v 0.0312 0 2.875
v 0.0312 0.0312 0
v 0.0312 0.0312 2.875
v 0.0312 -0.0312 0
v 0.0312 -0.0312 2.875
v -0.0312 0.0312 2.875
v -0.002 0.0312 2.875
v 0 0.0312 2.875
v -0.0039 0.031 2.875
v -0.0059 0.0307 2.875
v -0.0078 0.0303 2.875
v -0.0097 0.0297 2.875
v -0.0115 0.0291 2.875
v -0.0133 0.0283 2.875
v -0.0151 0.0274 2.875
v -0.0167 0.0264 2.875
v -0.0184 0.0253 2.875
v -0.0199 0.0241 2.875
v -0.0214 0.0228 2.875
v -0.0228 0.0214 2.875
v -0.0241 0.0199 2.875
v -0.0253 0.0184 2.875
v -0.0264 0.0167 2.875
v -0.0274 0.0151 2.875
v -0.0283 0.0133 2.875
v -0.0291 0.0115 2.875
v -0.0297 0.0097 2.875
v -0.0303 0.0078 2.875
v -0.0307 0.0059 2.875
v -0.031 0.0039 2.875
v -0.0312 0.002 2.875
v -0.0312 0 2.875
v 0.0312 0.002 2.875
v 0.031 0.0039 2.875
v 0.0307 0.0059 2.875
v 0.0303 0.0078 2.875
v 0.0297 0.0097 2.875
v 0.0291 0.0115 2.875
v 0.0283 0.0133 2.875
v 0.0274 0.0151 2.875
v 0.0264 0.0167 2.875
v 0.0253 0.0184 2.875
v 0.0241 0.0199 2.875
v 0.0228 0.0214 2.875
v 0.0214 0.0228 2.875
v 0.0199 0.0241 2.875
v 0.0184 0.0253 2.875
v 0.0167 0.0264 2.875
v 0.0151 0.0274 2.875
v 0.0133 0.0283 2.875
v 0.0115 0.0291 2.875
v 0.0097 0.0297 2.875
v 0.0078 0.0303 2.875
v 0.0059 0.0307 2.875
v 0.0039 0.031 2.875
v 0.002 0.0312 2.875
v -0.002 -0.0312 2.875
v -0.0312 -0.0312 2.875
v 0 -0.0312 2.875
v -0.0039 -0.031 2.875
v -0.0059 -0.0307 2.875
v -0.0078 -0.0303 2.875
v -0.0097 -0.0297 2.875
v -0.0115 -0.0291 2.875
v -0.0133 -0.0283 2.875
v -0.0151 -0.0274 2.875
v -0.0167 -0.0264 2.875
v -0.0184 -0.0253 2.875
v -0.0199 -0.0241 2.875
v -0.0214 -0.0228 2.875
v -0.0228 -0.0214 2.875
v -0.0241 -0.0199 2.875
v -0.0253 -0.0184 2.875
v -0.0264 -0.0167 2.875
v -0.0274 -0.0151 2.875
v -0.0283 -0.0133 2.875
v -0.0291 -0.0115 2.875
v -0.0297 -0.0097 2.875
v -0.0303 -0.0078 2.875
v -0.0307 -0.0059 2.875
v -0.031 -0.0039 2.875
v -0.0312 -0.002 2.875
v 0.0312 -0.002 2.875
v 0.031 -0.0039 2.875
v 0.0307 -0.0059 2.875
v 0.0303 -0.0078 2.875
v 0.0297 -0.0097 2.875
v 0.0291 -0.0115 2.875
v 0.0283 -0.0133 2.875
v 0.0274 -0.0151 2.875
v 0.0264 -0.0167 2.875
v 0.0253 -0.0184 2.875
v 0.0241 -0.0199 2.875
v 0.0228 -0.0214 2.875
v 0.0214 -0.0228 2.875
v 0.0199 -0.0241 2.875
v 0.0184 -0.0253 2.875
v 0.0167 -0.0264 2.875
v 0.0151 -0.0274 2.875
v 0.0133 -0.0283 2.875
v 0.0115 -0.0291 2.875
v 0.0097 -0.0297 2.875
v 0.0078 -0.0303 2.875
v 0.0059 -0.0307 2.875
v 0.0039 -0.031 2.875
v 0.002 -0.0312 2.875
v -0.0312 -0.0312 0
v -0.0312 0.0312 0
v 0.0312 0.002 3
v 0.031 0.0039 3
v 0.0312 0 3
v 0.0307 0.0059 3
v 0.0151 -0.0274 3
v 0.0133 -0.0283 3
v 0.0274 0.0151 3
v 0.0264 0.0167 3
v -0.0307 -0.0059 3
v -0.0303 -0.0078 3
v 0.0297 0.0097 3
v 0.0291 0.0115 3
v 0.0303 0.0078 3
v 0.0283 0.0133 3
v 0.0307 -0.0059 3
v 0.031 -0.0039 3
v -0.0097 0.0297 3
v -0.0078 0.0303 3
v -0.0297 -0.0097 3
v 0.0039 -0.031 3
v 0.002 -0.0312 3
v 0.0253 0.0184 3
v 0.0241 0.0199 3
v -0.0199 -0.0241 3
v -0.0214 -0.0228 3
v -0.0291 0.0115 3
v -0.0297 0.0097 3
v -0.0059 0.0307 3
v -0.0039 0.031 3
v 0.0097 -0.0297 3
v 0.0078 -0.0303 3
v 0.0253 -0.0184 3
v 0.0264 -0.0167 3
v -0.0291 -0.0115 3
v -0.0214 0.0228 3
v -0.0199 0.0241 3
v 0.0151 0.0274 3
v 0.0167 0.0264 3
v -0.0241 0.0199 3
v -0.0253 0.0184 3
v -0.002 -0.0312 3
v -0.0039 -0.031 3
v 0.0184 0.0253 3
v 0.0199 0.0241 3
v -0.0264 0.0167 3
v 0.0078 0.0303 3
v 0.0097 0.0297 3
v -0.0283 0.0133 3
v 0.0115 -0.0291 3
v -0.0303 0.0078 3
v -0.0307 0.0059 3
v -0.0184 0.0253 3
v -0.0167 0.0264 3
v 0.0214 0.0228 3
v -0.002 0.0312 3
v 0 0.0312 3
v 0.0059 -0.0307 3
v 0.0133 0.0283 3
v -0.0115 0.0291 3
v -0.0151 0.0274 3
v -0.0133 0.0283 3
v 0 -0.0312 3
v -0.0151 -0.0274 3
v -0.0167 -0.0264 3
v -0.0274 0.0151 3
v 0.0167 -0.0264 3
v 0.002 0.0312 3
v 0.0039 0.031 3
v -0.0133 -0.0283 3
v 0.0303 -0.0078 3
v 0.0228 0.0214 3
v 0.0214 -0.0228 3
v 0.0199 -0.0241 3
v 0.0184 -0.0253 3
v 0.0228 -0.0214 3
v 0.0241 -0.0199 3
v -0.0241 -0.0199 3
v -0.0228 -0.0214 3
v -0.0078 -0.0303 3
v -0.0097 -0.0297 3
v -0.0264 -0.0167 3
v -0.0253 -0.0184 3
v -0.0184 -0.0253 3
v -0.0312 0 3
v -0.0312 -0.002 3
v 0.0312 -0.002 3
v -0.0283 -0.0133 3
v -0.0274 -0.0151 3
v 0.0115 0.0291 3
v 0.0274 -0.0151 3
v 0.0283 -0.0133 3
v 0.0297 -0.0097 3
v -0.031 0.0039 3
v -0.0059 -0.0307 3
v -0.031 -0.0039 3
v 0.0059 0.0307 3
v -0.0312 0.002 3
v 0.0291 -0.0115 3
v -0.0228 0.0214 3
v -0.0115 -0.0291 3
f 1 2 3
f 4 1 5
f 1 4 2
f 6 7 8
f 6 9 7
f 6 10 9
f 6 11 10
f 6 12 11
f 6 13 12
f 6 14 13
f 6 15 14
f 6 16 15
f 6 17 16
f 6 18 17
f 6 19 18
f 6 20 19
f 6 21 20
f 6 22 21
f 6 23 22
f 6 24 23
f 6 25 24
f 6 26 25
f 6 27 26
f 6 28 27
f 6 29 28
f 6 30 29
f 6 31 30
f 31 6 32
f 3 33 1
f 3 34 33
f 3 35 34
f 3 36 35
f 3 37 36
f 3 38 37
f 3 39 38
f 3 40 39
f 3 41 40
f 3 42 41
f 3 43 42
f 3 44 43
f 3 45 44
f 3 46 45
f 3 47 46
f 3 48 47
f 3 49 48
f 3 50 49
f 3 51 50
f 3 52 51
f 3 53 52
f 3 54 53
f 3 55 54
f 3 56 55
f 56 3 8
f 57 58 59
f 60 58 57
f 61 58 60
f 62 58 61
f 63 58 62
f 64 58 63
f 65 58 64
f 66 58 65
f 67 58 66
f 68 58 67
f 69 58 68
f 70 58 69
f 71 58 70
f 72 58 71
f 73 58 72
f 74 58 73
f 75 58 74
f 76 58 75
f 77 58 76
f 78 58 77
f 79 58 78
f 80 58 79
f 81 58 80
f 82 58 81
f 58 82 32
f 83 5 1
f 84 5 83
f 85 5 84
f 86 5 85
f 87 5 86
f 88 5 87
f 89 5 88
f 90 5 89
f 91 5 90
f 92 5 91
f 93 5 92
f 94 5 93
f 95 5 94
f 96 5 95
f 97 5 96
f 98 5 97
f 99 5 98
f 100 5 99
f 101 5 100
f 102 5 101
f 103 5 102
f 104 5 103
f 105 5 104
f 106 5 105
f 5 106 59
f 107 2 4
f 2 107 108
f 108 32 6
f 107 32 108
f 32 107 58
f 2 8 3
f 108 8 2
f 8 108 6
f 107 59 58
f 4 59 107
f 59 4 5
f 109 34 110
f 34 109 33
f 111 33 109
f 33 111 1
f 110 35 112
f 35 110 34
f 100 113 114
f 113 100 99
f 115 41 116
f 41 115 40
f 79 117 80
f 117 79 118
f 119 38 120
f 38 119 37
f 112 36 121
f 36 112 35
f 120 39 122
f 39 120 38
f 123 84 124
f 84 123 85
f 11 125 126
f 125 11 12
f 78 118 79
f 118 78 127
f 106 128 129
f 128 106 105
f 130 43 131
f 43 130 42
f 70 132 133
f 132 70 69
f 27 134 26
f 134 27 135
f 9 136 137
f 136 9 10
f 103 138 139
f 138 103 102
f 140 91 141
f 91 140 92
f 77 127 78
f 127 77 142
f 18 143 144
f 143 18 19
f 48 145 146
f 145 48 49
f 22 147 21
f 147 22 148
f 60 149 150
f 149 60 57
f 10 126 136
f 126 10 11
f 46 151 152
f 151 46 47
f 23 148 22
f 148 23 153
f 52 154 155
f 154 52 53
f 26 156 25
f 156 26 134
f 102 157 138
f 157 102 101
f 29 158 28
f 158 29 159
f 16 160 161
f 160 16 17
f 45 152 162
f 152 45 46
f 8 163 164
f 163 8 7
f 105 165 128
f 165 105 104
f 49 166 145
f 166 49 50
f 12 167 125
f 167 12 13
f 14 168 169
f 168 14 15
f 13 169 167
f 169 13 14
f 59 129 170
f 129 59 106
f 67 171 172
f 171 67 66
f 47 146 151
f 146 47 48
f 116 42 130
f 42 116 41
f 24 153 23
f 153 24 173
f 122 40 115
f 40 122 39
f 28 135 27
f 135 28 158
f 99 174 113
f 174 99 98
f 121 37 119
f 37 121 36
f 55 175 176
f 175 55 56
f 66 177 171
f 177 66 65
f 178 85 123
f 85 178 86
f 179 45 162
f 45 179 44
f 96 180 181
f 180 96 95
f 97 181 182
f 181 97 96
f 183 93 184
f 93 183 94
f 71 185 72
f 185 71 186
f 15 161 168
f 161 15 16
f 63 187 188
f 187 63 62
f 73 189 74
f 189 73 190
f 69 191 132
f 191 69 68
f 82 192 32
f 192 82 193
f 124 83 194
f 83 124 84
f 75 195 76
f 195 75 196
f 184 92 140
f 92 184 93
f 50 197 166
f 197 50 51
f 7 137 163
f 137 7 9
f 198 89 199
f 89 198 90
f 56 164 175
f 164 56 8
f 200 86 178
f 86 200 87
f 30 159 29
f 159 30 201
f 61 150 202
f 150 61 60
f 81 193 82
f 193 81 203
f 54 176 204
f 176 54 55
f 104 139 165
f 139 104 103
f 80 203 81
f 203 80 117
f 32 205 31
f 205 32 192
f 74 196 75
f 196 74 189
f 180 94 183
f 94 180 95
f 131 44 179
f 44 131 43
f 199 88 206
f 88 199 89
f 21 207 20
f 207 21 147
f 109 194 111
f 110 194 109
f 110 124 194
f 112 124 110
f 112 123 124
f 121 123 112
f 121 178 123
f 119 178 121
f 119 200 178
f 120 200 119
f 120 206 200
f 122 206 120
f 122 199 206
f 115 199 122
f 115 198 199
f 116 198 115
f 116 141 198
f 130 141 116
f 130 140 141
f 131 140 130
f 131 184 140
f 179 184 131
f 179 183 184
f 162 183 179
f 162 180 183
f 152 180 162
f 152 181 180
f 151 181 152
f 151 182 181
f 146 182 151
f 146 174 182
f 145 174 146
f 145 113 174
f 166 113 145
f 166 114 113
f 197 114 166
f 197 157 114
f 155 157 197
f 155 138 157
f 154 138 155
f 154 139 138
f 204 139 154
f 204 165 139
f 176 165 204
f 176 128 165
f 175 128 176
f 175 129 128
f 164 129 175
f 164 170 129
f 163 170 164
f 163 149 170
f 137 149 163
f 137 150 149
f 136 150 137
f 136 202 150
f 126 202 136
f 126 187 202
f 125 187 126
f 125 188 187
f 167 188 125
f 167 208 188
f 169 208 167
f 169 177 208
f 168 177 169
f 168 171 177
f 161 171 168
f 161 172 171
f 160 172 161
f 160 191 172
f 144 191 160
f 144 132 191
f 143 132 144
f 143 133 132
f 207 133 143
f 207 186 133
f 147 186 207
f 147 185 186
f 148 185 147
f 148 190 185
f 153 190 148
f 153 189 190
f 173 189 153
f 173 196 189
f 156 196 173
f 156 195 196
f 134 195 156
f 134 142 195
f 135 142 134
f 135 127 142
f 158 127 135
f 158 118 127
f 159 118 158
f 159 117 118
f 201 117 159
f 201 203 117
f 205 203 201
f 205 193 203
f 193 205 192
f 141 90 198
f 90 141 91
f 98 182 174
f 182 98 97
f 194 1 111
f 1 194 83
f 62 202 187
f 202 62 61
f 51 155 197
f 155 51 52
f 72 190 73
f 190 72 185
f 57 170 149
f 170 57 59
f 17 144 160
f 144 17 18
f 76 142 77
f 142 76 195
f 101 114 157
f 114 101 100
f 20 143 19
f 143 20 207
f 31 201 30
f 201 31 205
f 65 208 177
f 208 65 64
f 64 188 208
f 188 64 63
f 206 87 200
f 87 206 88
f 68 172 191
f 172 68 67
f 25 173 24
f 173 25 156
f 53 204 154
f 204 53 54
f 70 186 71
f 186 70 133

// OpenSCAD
// file: ../../prop/colors.scad
// colors.scad
// Credit: David Powell, OpenSCAN Forum



//group ABS_<colorname>
//	discription  common 3d printer ABS filament colors
// actual colours may need some tweaking

ABS_Nature =[0.8,0.8,0.8,0.8];
ABS_White =[0.9,0.9,0.9,1];
ABS_Black =[0.1,0.1,0.1,1];
ABS_Red = [0.7,0,0,1];
ABS_Green = [0,0.7,0,1];
ABS_Blue = [0,0,0.7,1];
ABS_Orange =[0.8,0.4,0,1];
ABS_Purple =[0.7,0,0.7,1];
ABS_Brown =[0.6,0.2,0.2,1];
ABS_Glow_Blue =[0,0,.99,1];
ABS_Flurescence_Green =[0,1,0,1];
ABS_Flurescence_Yellow = [0.9,0.9,0,1];

//group PLA_<colorname>
//	discription  common 3d printer PLA filament colors
// actual colours may need some tweaking

PLA_Nature =[0.8,0.8,0.8,0.8];
PLA_White =[0.9,0.9,0.9,1];
PLA_Black =[0.1,0.1,0.1,1];
PLA_Red = [0.7,0,0,1];
PLA_Green = [0,0.7,0,1];
PLA_Blue = [0,0,0.7,1];
PLA_Orange =[0.8,0.4,0,1];
PLA_Purple =[0.7,0,0.7,1];
PLA_Brown =[0.6,0.2,0.2,1];
PLA_Glow_Blue =[0,0,.99,1];
PLA_Flurescence_Green =[0,1,0,1];
PLA_Flurescence_Yellow = [0.9,0.9,0,1];

//group ANODIZED_<colorname>
//	discription  common aluminium anodized colors
// these don't seem to follow normal color tables as the process
// produces a color change difference to the named color
// dew to base metal
// actual colours may need some tweaking

ANODIZED_Red =[0.7,0,0,1];
ANODIZED_Gold =[0.8,0.8,0.0,1];
ANODIZED_Black =[0.1,0.1,0.1,1];
ANODIZED_Blue =[0,0,0.7,1];
ANODIZED_Green =[0,0.5,0,1];
ANODIZED_Gray =[0.4,0.4,0.4,1];
ANODIZED_Dark_Blue =[0,0.2,0.6,1];
ANODIZED_Lime_Green =[0,0.8,0,1];
ANODIZED_Purple =[0.5,0,0.7,1];		//more blue than purple
ANODIZED_Light_Blue =[0.4,0.4,1,1];
ANODIZED_Pink =[0.7,0,0.7,1];		//more purlpe than pink
ANODIZED_Orange =[0.9,0.5,0,1];
ANODIZED_Scandia_Gold =[0.9,0.6,0.3,1];
ANODIZED_Copper =[0.7,0.5,0,1];		//more brown than copper
ANODIZED_Clear =[0.7,0.7,0.9,1];	//natural aluminium color
ANODIZED_Light_Bronze =[0.4,0.4,0.3,1]; //more silver than bronze
ANODIZED_Gold_Nickel =[0.8,0.8,0.6,1];
ANODIZED_Brush_Nickel =[0.8,0.8,0.7,1];

//group METAL_<typename>
//	discription common metal colors
// colors need tweaking

METAL_Aluminium = [0.7,0.7,0.8,1];
METAL_Brass = [0.88,0.78,0.5,1];
METAL_Copper = [0.9,0.6,0.5,1];
METAL_Steel = [0.9,0.9,0.8,1];
METAL_Stainless = [0.8,0.8,0.7,1];
METAL_Titanium = [0.7,0.7,0.6,1];
METAL_Bronze = [0.9,0.4,0.4,1];
METAL_Gold = [0.9,0.9,0.0,1];
METAL_Silver = [0.8,0.8,0.8,1];
METAL_Iron = [0.6,0.6,0.6,1];

// group WOOD_<typename>
//	discription common wood colors
// probabaly wrong

WOOD_Oak = [0.4,0.2,0.2,1];
WOOD_Birch = [0.8,0.8,0.4,1];
WOOD_Red = [0.7,0.3,0.3,1];
WOOD_pine = [0.8,0.8,0.4,1];
WOOD_Beach = [0.8,0.6,0.3,1];
WOOD_Spruce = [0.8,0.8,0.7,1];
WOOD_Balsa = [0.95,0.86,0.73];

// group GLASS_<color>
//	discription common glass colors
// needs tweaking

GLASS_Clear = [0.8,0.8,0.8,0.2];
GLASS_Red = [0.8,0,0,0.4];
GLASS_Green = [0,0.8,0,.4];
GLASS_Blue = [0,0,0.8,.4];
GLASS_Brown = [0.5,0.3,0.1,.4];

CONCRETE = [210/255, 209/255, 205/255];
// file: ../thrust_bearing/colors.scad
// colors.scad
// Credit: David Powell, OpenSCAN Forum



//group ABS_<colorname>
//	discription  common 3d printer ABS filament colors
// actual colours may need some tweaking

ABS_Nature =[0.8,0.8,0.8,0.8];
ABS_White =[0.9,0.9,0.9,1];
ABS_Black =[0.1,0.1,0.1,1];
ABS_Red = [0.7,0,0,1];
ABS_Green = [0,0.7,0,1];
ABS_Blue = [0,0,0.7,1];
ABS_Orange =[0.8,0.4,0,1];
ABS_Purple =[0.7,0,0.7,1];
ABS_Brown =[0.6,0.2,0.2,1];
ABS_Glow_Blue =[0,0,.99,1];
ABS_Flurescence_Green =[0,1,0,1];
ABS_Flurescence_Yellow = [0.9,0.9,0,1];

//group PLA_<colorname>
//	discription  common 3d printer PLA filament colors
// actual colours may need some tweaking

PLA_Nature =[0.8,0.8,0.8,0.8];
PLA_White =[0.9,0.9,0.9,1];
PLA_Black =[0.1,0.1,0.1,1];
PLA_Red = [0.7,0,0,1];
PLA_Green = [0,0.7,0,1];
PLA_Blue = [0,0,0.7,1];
PLA_Orange =[0.8,0.4,0,1];
PLA_Purple =[0.7,0,0.7,1];
PLA_Brown =[0.6,0.2,0.2,1];
PLA_Glow_Blue =[0,0,.99,1];
PLA_Flurescence_Green =[0,1,0,1];
PLA_Flurescence_Yellow = [0.9,0.9,0,1];

//group ANODIZED_<colorname>
//	discription  common aluminium anodized colors
// these don't seem to follow normal color tables as the process
// produces a color change difference to the named color
// dew to base metal
// actual colours may need some tweaking

ANODIZED_Red =[0.7,0,0,1];
ANODIZED_Gold =[0.8,0.8,0.0,1];
ANODIZED_Black =[0.1,0.1,0.1,1];
ANODIZED_Blue =[0,0,0.7,1];
ANODIZED_Green =[0,0.5,0,1];
ANODIZED_Gray =[0.4,0.4,0.4,1];
ANODIZED_Dark_Blue =[0,0.2,0.6,1];
ANODIZED_Lime_Green =[0,0.8,0,1];
ANODIZED_Purple =[0.5,0,0.7,1];		//more blue than purple
ANODIZED_Light_Blue =[0.4,0.4,1,1];
ANODIZED_Pink =[0.7,0,0.7,1];		//more purlpe than pink
ANODIZED_Orange =[0.9,0.5,0,1];
ANODIZED_Scandia_Gold =[0.9,0.6,0.3,1];
ANODIZED_Copper =[0.7,0.5,0,1];		//more brown than copper
ANODIZED_Clear =[0.7,0.7,0.9,1];	//natural aluminium color
ANODIZED_Light_Bronze =[0.4,0.4,0.3,1]; //more silver than bronze
ANODIZED_Gold_Nickel =[0.8,0.8,0.6,1];
ANODIZED_Brush_Nickel =[0.8,0.8,0.7,1];

//group METAL_<typename>
//	discription common metal colors
// colors need tweaking

METAL_Aluminium = [0.7,0.7,0.8,1];
METAL_Brass = [0.88,0.78,0.5,1];
METAL_Copper = [0.9,0.6,0.5,1];
METAL_Steel = [0.9,0.9,0.8,1];
METAL_Stainless = [0.8,0.8,0.7,1];
METAL_Titanium = [0.7,0.7,0.6,1];
METAL_Bronze = [0.9,0.4,0.4,1];
METAL_Gold = [0.9,0.9,0.0,1];
METAL_Silver = [0.8,0.8,0.8,1];
METAL_Iron = [0.6,0.6,0.6,1];

// group WOOD_<typename>
//	discription common wood colors
// probabaly wrong

WOOD_Oak = [0.4,0.2,0.2,1];
WOOD_Birch = [0.8,0.8,0.4,1];
WOOD_Red = [0.7,0.3,0.3,1];
WOOD_pine = [0.8,0.8,0.4,1];
WOOD_Beach = [0.8,0.6,0.3,1];
WOOD_Spruce = [0.8,0.8,0.7,1];
WOOD_Balsa = [0.95,0.86,0.73];

// group GLASS_<color>
//	discription common glass colors
// needs tweaking

GLASS_Clear = [0.8,0.8,0.8,0.2];
GLASS_Red = [0.8,0,0,0.4];
GLASS_Green = [0,0.8,0,.4];
GLASS_Blue = [0,0,0.8,.4];
GLASS_Brown = [0.5,0.3,0.1,.4];

CONCRETE = [210/255, 209/255, 205/255];
// file: ../../prop/prop_data.scad
//#####################################
// prop-blade-data.scad
// (c) 2021 by Roie R. Black
//*************************************
include <colors.scad>
include <../constraints.scad>

// Propeller dimensions
prop_radius = max_prop_diameter/2;
prop_pitch_angle = 40;
prop_blade_offset = 0.5;

// prop spar dimensions
prop_spar_inner_radius = 1/32;
prop_spar_outer_radius = 1/64;
prop_spar_length = 4;

prop_spar_color = WOOD_Balsa;

// prop blade dimensions
prop_blade_thickness = 1/64;
prop_max_chord = 1.85;

// prop form dimensions
prop_form_radius = 2.5;
prop_form_height = prop_radius + 2;
prop_form_angle = 14;

// elliptic form data
s = prop_radius - 1;
c = 2.5;
f = 2;
s1 = 1;
s2 = s - s1;
s3 = 1;
s4 = 1;

prop_blade_color = WOOD_Balsa;

//-------------------------------------
// calculated by analysis
prop_forward_x = -1.3287;
// file: ../motor_stick/motor_stick_data.scad
//#####################################
// motor-stick-data.scad
// (c) 2021 by Roie R. Black
//*************************************

ms_thickness = 1/8;
motor_stick_rear_height = 0.1875;
ms_length = 10;

ms_points = [
	[0,0],
	[9.625,0],
	[9.8125,-0.1875],
	[10.0,0],
	[10.0,0.1875],
	[6.625,0.25],
	[1.625,0.25],
	[0.10825,0.1875],
	[0,0]
];
// file: ../thrust_bearing/thrust_bearing_data.scad
//#####################################
// thrust_bearing_data.scad
// (c) 2021 by Roie R. Black
//=====================================
include <colors.scad>

thickness = 1/32;
length = 1/2;
height = 3/16;
width = 1/16;
front_height = height/3;
top_length = 3/16;
wire_size = 0.025;


thrust_bearing_color = METAL_Aluminium;
density = 168.77;
// file: ../../materials.scad
//###########################################
// materials.scad
// (c) 2021 - Roie R. Black
//*******************************************

tube_thickness = 1/64;
tube_height = 1/8;
post_diameter = 1/16;
// file: ../../constraints.scad
//####################################
// Math-Magik LPP - Design Constraints
// (c) 2021 by Roie R. Black
//====================================

// AMA Rules for event 208
//------------------------------------

max_overall_length = 20;
max_projected_wing_span = 18;
max_bearing_to_rear_hook = 10;
max_wing_chord = 5;
max_stab_span = 12;
max_stab_chord = 4;
max_prop_diameter = 12;
// file: colors.scad
// colors.scad
// Credit: David Powell, OpenSCAN Forum



//group ABS_<colorname>
//	discription  common 3d printer ABS filament colors
// actual colours may need some tweaking

ABS_Nature =[0.8,0.8,0.8,0.8];
ABS_White =[0.9,0.9,0.9,1];
ABS_Black =[0.1,0.1,0.1,1];
ABS_Red = [0.7,0,0,1];
ABS_Green = [0,0.7,0,1];
ABS_Blue = [0,0,0.7,1];
ABS_Orange =[0.8,0.4,0,1];
ABS_Purple =[0.7,0,0.7,1];
ABS_Brown =[0.6,0.2,0.2,1];
ABS_Glow_Blue =[0,0,.99,1];
ABS_Flurescence_Green =[0,1,0,1];
ABS_Flurescence_Yellow = [0.9,0.9,0,1];

//group PLA_<colorname>
//	discription  common 3d printer PLA filament colors
// actual colours may need some tweaking

PLA_Nature =[0.8,0.8,0.8,0.8];
PLA_White =[0.9,0.9,0.9,1];
PLA_Black =[0.1,0.1,0.1,1];
PLA_Red = [0.7,0,0,1];
PLA_Green = [0,0.7,0,1];
PLA_Blue = [0,0,0.7,1];
PLA_Orange =[0.8,0.4,0,1];
PLA_Purple =[0.7,0,0.7,1];
PLA_Brown =[0.6,0.2,0.2,1];
PLA_Glow_Blue =[0,0,.99,1];
PLA_Flurescence_Green =[0,1,0,1];
PLA_Flurescence_Yellow = [0.9,0.9,0,1];

//group ANODIZED_<colorname>
//	discription  common aluminium anodized colors
// these don't seem to follow normal color tables as the process
// produces a color change difference to the named color
// dew to base metal
// actual colours may need some tweaking

ANODIZED_Red =[0.7,0,0,1];
ANODIZED_Gold =[0.8,0.8,0.0,1];
ANODIZED_Black =[0.1,0.1,0.1,1];
ANODIZED_Blue =[0,0,0.7,1];
ANODIZED_Green =[0,0.5,0,1];
ANODIZED_Gray =[0.4,0.4,0.4,1];
ANODIZED_Dark_Blue =[0,0.2,0.6,1];
ANODIZED_Lime_Green =[0,0.8,0,1];
ANODIZED_Purple =[0.5,0,0.7,1];		//more blue than purple
ANODIZED_Light_Blue =[0.4,0.4,1,1];
ANODIZED_Pink =[0.7,0,0.7,1];		//more purlpe than pink
ANODIZED_Orange =[0.9,0.5,0,1];
ANODIZED_Scandia_Gold =[0.9,0.6,0.3,1];
ANODIZED_Copper =[0.7,0.5,0,1];		//more brown than copper
ANODIZED_Clear =[0.7,0.7,0.9,1];	//natural aluminium color
ANODIZED_Light_Bronze =[0.4,0.4,0.3,1]; //more silver than bronze
ANODIZED_Gold_Nickel =[0.8,0.8,0.6,1];
ANODIZED_Brush_Nickel =[0.8,0.8,0.7,1];

//group METAL_<typename>
//	discription common metal colors
// colors need tweaking

METAL_Aluminium = [0.7,0.7,0.8,1];
METAL_Brass = [0.88,0.78,0.5,1];
METAL_Copper = [0.9,0.6,0.5,1];
METAL_Steel = [0.9,0.9,0.8,1];
METAL_Stainless = [0.8,0.8,0.7,1];
METAL_Titanium = [0.7,0.7,0.6,1];
METAL_Bronze = [0.9,0.4,0.4,1];
METAL_Gold = [0.9,0.9,0.0,1];
METAL_Silver = [0.8,0.8,0.8,1];
METAL_Iron = [0.6,0.6,0.6,1];

// group WOOD_<typename>
//	discription common wood colors
// probabaly wrong

WOOD_Oak = [0.4,0.2,0.2,1];
WOOD_Birch = [0.8,0.8,0.4,1];
WOOD_Red = [0.7,0.3,0.3,1];
WOOD_pine = [0.8,0.8,0.4,1];
WOOD_Beach = [0.8,0.6,0.3,1];
WOOD_Spruce = [0.8,0.8,0.7,1];
WOOD_Balsa = [0.95,0.86,0.73];

// group GLASS_<color>
//	discription common glass colors
// needs tweaking

GLASS_Clear = [0.8,0.8,0.8,0.2];
GLASS_Red = [0.8,0,0,0.4];
GLASS_Green = [0,0.8,0,.4];
GLASS_Blue = [0,0,0.8,.4];
GLASS_Brown = [0.5,0.3,0.1,.4];

CONCRETE = [210/255, 209/255, 205/255];
// file: ../fuselage_data.scad
//###########################################
// fuselage-data.scad
// (c) 2021 - Roie R. Black
//*******************************************
include <../constraints.scad>
include <../materials.scad>
include <thrust_bearing/thrust_bearing_data.scad>
include <motor_stick/motor_stick_data.scad>
include <../prop/prop_data.scad>

// prop adjustment
prop_x_offset = 1/16;

// wing position dimensions
wing_offset = 1.625;
wing_elevation = 3;

// tail boom data
tb_color = WOOD_Balsa;

tb_front_height = 3/16;
tb_rear_height = 1/16;
tb_thickness = 3/32;

tail_boom_overlap = 1/8;
tail_boom_length = max_overall_length -ms_length + prop_forward_x + tail_boom_overlap;
tail_boom_rear_x = max_overall_length + prop_x_offset;


//adjust motor stick to fit bearing
fuse_offset = length - top_length - 3 * tube_thickness;
prop_z_offset = height;

// front post position
fp_offset = wing_offset - post_diameter/2 - tube_thickness;

// rear post position
rp_offset = wing_offset + max_wing_chord + post_diameter/2 + tube_thickness;


//-------------------------------------
// calculated values

tail_boom_angle = atan2(tb_front_height - tb_rear_height,tail_boom_length);

// stab positioning data
srp_offset = tail_boom_rear_x - post_diameter - tube_thickness-1/16;
sfp_offset = srp_offset - max_stab_chord - post_diameter - tube_thickness-1/64;
// file: MMlib/rounded_post.scad
//########################################################
// rounded post.scad - square post with rounded top
// (c) 2021 - Roie R. Black
//========================================================
$fn=100;

module rounded_post(z1=3, z2=2.5, t = 0.25) {
  union() {
      translate([-t/2,-t/2,0])
      cube([t,t,z2]);
      translate([0,0,z2])
      cylinder(r=t/2, h=z1-z2);
  }
}

rounded_post();
// file: wing_post_data.scad
//#####################################
// wing_post_data.scad
// (c) 2021 by Roie R. Black
//*************************************
include <../fuselage_data.scad>
include <colors.scad>

wing_post_color = WOOD_Balsa;
wing_post_height = wing_elevation;
// main file
//#####################################
// wing_post.scad
// (c) 2021 by Roie R. Black
//*************************************
include <wing_post_data.scad>
$fn=100;
use <MMlib/rounded_post.scad>

module wing_post() {
  color(wing_post_color)
    translate([0,0,0])
      rounded_post(
        z1=wing_post_height,
        z2= wing_post_height-tube_height,
        t = post_diameter
      );
}

//---------------------------------------
// debug display

wing_post();
